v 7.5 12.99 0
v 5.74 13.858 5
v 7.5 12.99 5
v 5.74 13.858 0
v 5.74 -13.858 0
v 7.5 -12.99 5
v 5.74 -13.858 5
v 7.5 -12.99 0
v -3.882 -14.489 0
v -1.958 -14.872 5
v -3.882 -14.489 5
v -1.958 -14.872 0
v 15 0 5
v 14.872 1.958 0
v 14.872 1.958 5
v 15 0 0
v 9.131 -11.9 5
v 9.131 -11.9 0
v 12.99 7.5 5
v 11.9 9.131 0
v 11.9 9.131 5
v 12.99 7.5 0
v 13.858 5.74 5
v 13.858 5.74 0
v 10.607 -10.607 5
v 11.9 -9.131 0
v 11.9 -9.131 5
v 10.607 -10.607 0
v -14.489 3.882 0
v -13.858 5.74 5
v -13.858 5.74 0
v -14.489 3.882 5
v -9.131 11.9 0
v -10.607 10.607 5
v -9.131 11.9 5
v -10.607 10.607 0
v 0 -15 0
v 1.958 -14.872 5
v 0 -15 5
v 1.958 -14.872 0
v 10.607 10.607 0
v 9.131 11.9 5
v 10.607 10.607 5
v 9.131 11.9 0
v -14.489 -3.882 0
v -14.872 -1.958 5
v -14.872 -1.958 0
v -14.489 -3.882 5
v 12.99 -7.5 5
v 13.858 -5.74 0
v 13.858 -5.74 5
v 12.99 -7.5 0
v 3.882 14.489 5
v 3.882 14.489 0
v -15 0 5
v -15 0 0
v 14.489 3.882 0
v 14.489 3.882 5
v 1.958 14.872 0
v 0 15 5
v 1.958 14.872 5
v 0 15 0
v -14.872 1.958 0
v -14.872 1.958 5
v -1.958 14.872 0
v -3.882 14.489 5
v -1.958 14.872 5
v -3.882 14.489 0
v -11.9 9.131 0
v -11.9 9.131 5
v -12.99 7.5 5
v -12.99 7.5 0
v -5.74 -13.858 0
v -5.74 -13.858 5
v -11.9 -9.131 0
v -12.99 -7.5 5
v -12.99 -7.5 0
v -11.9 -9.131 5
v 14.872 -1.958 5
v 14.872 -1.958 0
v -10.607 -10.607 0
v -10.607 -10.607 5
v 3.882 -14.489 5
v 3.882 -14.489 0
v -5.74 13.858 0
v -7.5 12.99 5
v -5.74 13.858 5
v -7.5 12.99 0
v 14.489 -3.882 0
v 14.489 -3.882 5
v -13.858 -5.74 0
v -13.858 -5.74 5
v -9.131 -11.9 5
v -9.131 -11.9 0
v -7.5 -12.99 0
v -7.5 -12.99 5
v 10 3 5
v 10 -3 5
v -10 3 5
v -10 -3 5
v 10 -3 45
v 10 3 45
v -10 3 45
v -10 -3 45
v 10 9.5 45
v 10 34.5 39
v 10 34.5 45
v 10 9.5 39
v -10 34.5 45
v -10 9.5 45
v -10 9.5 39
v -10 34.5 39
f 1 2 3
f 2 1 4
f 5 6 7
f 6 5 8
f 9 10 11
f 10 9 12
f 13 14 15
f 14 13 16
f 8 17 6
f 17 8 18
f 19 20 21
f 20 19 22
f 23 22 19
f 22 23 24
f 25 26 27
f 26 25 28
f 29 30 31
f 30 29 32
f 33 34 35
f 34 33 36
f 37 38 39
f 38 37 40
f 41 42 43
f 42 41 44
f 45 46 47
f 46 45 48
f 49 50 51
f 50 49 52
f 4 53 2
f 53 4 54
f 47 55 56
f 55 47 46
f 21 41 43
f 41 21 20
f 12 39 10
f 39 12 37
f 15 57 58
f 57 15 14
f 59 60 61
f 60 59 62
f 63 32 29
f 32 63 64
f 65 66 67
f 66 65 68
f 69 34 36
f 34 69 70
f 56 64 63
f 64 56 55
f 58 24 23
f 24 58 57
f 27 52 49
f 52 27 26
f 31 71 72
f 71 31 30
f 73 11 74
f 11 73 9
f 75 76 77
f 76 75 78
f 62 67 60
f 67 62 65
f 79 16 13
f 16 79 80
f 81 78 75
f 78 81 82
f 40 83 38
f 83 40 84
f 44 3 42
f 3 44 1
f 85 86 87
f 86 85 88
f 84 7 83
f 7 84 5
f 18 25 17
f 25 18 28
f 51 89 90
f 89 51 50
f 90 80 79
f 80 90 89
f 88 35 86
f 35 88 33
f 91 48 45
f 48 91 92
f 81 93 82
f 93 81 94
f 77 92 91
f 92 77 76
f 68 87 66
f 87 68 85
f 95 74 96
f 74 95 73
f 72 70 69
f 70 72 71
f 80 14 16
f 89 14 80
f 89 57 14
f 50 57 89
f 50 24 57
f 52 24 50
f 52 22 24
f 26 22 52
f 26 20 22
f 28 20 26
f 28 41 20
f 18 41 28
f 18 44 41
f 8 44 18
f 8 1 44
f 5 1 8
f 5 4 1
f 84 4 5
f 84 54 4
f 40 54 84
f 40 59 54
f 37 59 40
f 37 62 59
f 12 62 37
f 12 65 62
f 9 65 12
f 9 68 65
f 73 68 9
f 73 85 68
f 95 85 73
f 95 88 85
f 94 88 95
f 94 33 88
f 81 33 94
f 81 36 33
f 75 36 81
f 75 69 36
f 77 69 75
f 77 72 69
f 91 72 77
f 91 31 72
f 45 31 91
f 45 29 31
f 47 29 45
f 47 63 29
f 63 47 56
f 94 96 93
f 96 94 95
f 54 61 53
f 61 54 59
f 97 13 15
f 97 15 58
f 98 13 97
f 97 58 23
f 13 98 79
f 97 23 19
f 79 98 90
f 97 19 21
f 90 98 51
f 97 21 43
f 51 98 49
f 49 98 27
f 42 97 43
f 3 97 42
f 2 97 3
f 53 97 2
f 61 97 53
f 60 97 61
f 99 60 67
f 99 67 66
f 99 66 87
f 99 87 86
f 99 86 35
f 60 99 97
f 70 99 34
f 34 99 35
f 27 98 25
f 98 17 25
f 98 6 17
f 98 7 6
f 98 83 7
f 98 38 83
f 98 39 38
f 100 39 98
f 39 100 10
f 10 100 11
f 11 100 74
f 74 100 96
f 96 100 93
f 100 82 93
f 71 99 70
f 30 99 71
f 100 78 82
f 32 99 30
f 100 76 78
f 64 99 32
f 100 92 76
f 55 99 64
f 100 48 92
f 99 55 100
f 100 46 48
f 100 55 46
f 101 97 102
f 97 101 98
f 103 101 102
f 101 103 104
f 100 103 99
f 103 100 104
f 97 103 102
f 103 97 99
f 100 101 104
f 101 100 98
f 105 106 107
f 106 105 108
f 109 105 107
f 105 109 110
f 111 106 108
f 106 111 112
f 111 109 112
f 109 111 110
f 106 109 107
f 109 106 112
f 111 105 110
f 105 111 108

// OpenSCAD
// Fridge hook end-effector — fits ~20mm bar handles
// Port of hardware/cad/fridge_hook.py
// Regenerate: openscad -o hardware/stl/fridge_hook_tool.stl hardware/scad/fridge_hook.scad

// Parameters (mm)
HOOK_OPENING    = 25.0;   // fits ~20mm bar
HOOK_DEPTH      = 40.0;
HOOK_THICKNESS  = 6.0;
HOOK_WIDTH      = 20.0;
MOUNT_DIAMETER  = 30.0;
MOUNT_THICKNESS = 5.0;

union() {
    // Mounting plate (circular)
    cylinder(h = MOUNT_THICKNESS, d = MOUNT_DIAMETER, $fn = 48);

    // Vertical arm
    translate([0, 0, MOUNT_THICKNESS])
        translate([-HOOK_WIDTH / 2, -HOOK_THICKNESS / 2, 0])
            cube([HOOK_WIDTH, HOOK_THICKNESS, HOOK_DEPTH]);

    // Horizontal hook tip
    translate([0, HOOK_OPENING / 2 - HOOK_THICKNESS / 2, MOUNT_THICKNESS + HOOK_DEPTH - HOOK_THICKNESS])
        translate([-HOOK_WIDTH / 2, 0, 0])
            cube([HOOK_WIDTH, HOOK_OPENING, HOOK_THICKNESS]);
}
